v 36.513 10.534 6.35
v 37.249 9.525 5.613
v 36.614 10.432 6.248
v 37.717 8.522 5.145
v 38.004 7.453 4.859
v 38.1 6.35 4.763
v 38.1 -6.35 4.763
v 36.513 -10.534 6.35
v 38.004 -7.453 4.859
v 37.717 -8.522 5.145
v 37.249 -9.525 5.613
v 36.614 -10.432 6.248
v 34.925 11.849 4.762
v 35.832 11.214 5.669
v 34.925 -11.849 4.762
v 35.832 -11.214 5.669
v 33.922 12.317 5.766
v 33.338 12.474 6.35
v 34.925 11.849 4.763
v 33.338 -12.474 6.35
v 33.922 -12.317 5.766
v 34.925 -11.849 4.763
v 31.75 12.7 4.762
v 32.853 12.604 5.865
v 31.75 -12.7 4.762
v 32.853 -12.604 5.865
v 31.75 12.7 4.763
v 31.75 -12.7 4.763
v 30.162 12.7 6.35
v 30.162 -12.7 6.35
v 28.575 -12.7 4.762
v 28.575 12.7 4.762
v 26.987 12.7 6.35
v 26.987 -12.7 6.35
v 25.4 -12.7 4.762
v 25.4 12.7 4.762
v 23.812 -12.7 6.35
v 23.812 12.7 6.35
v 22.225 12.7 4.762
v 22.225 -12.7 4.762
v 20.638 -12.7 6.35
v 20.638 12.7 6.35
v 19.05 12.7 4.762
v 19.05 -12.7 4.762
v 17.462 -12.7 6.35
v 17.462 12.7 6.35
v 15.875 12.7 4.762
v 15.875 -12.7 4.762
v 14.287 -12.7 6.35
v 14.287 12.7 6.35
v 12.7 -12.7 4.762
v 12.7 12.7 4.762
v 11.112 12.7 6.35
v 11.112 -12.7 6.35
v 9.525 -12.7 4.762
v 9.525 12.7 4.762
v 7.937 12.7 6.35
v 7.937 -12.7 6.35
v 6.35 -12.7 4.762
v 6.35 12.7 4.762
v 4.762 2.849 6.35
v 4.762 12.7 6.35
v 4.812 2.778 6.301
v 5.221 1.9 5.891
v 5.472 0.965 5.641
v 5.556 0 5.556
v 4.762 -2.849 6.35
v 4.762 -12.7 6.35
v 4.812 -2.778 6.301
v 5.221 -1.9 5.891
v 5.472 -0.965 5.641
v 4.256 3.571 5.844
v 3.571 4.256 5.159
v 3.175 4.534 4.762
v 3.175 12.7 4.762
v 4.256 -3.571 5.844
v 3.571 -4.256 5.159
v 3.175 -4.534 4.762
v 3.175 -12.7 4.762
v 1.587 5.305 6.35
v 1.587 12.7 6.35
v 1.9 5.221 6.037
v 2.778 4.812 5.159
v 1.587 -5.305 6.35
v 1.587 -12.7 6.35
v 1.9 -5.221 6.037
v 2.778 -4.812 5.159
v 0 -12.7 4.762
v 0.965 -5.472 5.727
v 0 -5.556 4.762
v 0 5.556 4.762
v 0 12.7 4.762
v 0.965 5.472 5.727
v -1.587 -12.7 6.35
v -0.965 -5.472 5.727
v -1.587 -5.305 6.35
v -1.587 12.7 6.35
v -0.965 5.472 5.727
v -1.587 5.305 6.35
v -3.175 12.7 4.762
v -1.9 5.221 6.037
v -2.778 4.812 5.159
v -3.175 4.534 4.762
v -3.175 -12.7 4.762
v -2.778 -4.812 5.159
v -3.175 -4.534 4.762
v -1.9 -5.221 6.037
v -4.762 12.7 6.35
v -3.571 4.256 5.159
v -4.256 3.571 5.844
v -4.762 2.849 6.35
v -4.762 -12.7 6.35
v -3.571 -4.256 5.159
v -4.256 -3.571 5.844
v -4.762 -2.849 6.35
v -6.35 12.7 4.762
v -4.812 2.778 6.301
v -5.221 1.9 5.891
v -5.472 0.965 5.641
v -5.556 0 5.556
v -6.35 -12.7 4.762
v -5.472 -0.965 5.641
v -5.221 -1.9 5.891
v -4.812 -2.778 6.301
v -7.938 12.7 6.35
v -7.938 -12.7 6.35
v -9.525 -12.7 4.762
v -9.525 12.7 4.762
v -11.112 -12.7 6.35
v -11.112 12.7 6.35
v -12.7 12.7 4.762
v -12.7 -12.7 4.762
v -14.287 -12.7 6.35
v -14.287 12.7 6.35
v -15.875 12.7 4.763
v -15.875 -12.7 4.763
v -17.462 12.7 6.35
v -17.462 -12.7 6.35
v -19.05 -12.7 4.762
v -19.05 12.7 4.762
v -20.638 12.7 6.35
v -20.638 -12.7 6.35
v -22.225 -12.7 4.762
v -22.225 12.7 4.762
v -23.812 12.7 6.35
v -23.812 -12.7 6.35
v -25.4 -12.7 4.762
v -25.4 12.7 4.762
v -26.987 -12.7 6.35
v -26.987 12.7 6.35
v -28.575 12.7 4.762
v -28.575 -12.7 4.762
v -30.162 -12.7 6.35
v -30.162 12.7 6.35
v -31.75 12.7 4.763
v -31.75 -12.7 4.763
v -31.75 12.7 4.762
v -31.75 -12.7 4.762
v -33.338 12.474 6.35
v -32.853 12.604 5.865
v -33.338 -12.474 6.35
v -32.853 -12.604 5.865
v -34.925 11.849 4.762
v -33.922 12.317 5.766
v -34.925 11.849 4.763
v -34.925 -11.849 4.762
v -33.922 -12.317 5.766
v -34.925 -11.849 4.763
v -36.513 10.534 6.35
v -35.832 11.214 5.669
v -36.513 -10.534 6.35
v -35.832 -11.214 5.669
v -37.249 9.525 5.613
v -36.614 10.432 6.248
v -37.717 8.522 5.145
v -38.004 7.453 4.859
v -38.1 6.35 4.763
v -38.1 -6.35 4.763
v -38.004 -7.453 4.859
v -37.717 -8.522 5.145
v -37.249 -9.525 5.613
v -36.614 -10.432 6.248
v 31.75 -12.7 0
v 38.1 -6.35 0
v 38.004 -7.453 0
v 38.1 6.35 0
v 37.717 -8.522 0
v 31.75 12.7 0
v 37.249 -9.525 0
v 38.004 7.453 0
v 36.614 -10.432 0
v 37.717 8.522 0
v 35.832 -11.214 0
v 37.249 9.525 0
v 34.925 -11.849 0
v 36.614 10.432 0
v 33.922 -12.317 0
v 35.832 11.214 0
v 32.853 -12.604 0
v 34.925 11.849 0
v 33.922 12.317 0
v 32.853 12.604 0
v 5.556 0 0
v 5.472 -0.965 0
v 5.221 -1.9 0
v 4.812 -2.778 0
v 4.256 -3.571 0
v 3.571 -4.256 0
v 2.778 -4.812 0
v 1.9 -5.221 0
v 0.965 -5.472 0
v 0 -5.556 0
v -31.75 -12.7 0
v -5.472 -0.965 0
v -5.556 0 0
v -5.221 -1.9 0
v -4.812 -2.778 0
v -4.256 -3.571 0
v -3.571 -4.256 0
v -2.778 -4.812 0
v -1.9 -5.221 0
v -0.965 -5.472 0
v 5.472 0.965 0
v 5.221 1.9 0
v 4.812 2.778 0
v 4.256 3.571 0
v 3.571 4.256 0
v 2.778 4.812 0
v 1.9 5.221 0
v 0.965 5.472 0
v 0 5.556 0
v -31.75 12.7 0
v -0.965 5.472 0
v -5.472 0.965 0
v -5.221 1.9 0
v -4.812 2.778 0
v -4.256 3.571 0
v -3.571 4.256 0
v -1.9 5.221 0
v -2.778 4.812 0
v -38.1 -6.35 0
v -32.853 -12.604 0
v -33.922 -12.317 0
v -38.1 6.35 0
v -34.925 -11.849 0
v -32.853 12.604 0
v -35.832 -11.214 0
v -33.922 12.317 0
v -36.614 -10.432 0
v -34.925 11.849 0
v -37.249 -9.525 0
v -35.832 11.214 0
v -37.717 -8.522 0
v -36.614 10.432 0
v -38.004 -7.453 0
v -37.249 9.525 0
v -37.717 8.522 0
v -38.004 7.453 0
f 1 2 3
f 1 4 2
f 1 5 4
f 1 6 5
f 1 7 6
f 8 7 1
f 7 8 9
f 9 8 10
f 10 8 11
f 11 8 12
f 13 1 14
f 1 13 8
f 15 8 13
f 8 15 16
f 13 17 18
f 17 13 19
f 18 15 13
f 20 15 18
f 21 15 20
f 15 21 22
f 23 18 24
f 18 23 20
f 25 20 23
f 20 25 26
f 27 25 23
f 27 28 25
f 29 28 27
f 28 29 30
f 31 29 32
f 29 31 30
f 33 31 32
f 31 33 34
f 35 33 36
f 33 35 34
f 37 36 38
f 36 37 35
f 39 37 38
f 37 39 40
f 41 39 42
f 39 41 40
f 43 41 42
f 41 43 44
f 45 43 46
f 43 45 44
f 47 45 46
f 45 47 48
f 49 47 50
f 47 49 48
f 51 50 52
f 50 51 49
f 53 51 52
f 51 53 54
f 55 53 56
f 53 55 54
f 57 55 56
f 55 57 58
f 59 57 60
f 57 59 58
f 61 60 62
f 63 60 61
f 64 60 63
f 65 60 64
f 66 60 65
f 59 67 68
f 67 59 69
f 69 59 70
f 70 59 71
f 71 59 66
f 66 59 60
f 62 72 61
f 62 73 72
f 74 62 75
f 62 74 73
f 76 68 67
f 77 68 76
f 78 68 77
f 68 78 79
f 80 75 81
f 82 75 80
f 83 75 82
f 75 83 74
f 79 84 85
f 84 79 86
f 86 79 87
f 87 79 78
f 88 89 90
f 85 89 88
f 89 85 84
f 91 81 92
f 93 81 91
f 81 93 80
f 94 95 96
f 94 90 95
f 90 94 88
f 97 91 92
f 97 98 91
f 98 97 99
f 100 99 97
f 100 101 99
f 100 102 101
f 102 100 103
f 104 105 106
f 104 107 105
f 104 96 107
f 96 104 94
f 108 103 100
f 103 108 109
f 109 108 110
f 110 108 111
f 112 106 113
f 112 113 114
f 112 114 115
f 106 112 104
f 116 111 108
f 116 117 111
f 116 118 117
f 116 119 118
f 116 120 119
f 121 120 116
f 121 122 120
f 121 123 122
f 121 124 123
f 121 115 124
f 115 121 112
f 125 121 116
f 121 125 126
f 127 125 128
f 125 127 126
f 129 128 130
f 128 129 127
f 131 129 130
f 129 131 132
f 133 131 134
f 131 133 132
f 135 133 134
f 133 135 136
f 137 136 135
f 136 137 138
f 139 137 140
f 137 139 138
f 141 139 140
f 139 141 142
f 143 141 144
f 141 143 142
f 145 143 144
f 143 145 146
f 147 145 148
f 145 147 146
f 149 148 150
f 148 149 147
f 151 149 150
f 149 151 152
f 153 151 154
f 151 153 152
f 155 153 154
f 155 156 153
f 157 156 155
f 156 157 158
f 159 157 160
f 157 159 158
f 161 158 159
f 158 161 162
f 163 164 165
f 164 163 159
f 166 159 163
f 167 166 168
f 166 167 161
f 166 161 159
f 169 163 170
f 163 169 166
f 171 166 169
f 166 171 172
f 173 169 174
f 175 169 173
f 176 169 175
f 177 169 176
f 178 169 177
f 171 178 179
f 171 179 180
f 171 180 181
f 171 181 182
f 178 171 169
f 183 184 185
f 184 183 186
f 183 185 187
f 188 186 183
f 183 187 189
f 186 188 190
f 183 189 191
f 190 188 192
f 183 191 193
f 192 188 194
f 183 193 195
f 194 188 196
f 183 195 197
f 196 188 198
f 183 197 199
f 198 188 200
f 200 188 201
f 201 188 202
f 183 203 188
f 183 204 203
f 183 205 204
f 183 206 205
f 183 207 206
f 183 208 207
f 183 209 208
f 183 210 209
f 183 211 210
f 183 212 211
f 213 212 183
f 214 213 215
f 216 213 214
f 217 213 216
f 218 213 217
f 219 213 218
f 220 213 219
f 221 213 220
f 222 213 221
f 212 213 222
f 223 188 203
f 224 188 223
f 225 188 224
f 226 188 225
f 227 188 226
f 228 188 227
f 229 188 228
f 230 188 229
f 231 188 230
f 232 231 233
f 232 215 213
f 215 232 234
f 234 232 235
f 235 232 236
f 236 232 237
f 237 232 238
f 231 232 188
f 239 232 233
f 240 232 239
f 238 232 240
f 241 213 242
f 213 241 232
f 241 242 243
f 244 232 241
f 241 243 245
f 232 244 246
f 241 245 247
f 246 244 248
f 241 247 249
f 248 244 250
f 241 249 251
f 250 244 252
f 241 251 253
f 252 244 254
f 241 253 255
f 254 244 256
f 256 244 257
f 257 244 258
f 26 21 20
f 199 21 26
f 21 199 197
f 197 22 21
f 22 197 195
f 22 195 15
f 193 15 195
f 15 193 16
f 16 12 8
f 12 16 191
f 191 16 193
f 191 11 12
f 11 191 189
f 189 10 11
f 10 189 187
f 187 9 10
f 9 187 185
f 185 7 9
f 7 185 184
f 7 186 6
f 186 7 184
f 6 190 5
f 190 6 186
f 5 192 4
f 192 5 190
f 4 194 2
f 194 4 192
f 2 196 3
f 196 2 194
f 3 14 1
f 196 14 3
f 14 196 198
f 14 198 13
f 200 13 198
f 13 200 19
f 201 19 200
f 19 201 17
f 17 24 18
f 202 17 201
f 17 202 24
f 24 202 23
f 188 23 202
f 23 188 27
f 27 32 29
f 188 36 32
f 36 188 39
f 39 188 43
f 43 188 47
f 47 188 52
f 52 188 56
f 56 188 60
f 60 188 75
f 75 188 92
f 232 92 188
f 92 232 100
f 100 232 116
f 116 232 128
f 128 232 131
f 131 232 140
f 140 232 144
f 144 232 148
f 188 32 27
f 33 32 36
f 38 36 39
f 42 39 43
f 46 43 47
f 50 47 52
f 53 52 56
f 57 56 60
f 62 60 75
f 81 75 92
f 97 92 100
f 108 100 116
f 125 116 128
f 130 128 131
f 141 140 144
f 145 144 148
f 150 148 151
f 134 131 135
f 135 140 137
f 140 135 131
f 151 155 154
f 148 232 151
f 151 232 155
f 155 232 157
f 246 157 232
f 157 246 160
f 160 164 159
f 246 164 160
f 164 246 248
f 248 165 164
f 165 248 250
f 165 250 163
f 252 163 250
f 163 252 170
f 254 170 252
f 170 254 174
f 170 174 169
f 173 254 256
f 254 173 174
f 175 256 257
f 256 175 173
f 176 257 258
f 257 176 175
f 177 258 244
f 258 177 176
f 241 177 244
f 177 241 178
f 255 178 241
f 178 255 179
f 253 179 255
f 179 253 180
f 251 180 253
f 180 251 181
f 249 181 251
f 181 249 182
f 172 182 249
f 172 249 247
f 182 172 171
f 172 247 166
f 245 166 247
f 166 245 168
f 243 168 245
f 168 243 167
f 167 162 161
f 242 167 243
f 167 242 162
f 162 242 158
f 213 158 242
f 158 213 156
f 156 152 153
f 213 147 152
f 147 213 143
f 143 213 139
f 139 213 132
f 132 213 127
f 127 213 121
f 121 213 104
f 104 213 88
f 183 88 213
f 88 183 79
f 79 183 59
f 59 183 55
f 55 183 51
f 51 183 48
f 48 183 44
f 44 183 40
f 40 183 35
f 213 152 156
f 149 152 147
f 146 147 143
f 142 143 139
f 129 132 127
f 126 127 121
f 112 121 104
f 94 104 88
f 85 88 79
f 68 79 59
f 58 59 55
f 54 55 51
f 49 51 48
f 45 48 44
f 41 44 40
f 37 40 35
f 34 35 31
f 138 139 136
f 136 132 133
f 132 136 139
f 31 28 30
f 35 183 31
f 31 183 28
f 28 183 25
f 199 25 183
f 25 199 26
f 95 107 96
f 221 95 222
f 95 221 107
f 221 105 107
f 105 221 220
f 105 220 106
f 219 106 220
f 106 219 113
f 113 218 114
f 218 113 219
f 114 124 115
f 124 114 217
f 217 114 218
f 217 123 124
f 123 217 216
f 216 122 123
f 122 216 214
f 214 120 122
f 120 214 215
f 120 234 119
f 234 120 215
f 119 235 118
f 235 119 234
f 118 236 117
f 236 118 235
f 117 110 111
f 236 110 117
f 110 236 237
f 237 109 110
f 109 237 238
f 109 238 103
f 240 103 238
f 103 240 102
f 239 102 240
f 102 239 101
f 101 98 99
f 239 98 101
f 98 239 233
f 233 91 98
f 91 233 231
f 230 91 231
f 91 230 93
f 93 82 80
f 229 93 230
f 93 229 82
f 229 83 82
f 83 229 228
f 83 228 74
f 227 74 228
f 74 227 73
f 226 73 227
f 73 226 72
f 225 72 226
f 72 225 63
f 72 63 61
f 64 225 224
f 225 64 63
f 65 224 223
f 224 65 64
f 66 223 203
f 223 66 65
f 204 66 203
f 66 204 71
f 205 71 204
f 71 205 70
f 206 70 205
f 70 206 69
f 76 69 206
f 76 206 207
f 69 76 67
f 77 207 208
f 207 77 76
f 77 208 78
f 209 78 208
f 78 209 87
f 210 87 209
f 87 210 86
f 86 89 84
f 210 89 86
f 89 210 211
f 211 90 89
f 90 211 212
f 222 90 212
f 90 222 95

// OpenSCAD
// file: ../lib/TOGShapeLib-v1.scad
// Private functions/modules

function tog_shapelib__zip(a0, a1, func) = assert(len(a0) == len(a1)) [
	for( i=[0:1:len(a0)-1] ) func(a0[i], a1[i])
];


// Intentionally exported:

module tog_shapelib_rounded_square(size, corner_radius, offset=0) {
	assert(corner_radius + offset > 0);
	assert(corner_radius < size[0]/2);
	assert(corner_radius < size[1]/2);
	// TODO: Special cases when those assertions would fail
	hull() for( ym=[-1,1] ) for( xm=[-1,1] ) {
		translate([
			xm*(size[0]/2-corner_radius),
			ym*(size[1]/2-corner_radius),
		]) circle(r=corner_radius+offset);
	}	
}

module tog_shapelib_rounded_beveled_square(size, bevel_size, rounding_radius, offset=0) {
	// Could special-case these, but in the meantime:
	assert(bevel_size > 0);
	// Make sure things don't go negative:
	assert(size[0]/2 - bevel_size - rounding_radius*0.414 >= 0);
	assert(size[1]/2 - bevel_size - rounding_radius*0.414 >= 0);
	
	hull() for( ym=[-1,1] ) for( xm=[-1,1] ) {
		translate([
			xm*(size[0]/2 - rounding_radius),
			ym*(size[1]/2 - bevel_size - rounding_radius*0.414),
		]) circle(r=rounding_radius+offset);
		translate([
			xm*(size[0]/2 - bevel_size - rounding_radius*0.414),
			ym*(size[1]/2 - rounding_radius),
		]) circle(r=rounding_radius+offset);
	}
}

module tog_shapelib_rounded_cube(size, corner_radius=0, offset=0) {
	if( corner_radius <= 0 ) {
		cube([size[0]-offset*2, size[1]-offset*2, size[2]-offset*2], center=true);
	} else {
		// TODO: Special case for corner_radius=0
		hull() for( zm=[-1,1] ) for( ym=[-1,1] ) for( xm=[-1,1] ) {
			translate([
				xm*(size[0]/2-corner_radius),
				ym*(size[1]/2-corner_radius),
				zm*(size[2]/2-corner_radius),
			]) sphere(r=corner_radius+offset);
		}
	}
}

module tog_shapelib_xy_rounded_cube(size, corner_radius, offset=0) {
	linear_extrude(size[2]+offset*2, center=true) tog_shapelib_rounded_square(size, corner_radius, offset=offset);
}
module tog_shapelib_xz_rounded_cube(size, corner_radius, offset=0) {
	rotate([90,0,0]) tog_shapelib_xy_rounded_cube([size[0], size[2], size[1]], corner_radius, offset=offset);
}
module tog_shapelib_yz_rounded_cube(size, corner_radius, offset=0) {
	rotate([0,90,0]) tog_shapelib_xy_rounded_cube([size[2], size[1], size[0]], corner_radius, offset=offset);
}

module tog_shapelib_facerounded_beveled_cube(size, corner_radius, face_corner_radius, offset=0) {
	outer_scale = [for(d=size) (d+offset*2)/d];
	inner_scale = [for(d=size) (d-corner_radius*2)/d]; // Purposely not taking offset into account for inner square
	outer_size = tog_shapelib__zip(size, outer_scale, function(si,sc) si*sc);
	inner_size = tog_shapelib__zip(size, inner_scale, function(si,sc) si*sc);
	hull() {
		tog_shapelib_xy_rounded_cube([inner_size[0], inner_size[1], outer_size[2]], face_corner_radius+offset);
		tog_shapelib_xz_rounded_cube([inner_size[0], outer_size[1], inner_size[2]], face_corner_radius+offset);
		tog_shapelib_yz_rounded_cube([outer_size[0], inner_size[1], inner_size[2]], face_corner_radius+offset);
	}
}
// main file
// PanelConnector-v1.0

inch = 25.4;

connector_length = 3*inch;
connector_width  = 1*inch;
connector_thickness = 3/16*inch;
zig_height       = 1/8*inch;
bolt_hole_diameter = 7/16*inch; // should accommodate a 3/8" bolt

preview_fn = 12;
render_fn  = 36;

include <../lib/TOGShapeLib-v1.scad>

$fn = $preview ? preview_fn : render_fn;

intersection() {
	union() {
		for( xm=[-1, 1] )
		for( x=[-connector_length/2+zig_height/2 : zig_height : connector_length/2] ) {
			translate([x*xm,0,connector_thickness]) rotate([0,45,0]) cube([zig_height/sqrt(2), connector_width*2, zig_height/sqrt(2)], center=true);
		}

		translate([0,0,connector_thickness/2]) cube([connector_length*2, connector_width*2, connector_thickness], center=true);
	}

	linear_extrude(connector_thickness*2) difference() {
		tog_shapelib_rounded_square([connector_length, connector_width], 1/4*inch);
		
		circle(d=bolt_hole_diameter);
	}
}
